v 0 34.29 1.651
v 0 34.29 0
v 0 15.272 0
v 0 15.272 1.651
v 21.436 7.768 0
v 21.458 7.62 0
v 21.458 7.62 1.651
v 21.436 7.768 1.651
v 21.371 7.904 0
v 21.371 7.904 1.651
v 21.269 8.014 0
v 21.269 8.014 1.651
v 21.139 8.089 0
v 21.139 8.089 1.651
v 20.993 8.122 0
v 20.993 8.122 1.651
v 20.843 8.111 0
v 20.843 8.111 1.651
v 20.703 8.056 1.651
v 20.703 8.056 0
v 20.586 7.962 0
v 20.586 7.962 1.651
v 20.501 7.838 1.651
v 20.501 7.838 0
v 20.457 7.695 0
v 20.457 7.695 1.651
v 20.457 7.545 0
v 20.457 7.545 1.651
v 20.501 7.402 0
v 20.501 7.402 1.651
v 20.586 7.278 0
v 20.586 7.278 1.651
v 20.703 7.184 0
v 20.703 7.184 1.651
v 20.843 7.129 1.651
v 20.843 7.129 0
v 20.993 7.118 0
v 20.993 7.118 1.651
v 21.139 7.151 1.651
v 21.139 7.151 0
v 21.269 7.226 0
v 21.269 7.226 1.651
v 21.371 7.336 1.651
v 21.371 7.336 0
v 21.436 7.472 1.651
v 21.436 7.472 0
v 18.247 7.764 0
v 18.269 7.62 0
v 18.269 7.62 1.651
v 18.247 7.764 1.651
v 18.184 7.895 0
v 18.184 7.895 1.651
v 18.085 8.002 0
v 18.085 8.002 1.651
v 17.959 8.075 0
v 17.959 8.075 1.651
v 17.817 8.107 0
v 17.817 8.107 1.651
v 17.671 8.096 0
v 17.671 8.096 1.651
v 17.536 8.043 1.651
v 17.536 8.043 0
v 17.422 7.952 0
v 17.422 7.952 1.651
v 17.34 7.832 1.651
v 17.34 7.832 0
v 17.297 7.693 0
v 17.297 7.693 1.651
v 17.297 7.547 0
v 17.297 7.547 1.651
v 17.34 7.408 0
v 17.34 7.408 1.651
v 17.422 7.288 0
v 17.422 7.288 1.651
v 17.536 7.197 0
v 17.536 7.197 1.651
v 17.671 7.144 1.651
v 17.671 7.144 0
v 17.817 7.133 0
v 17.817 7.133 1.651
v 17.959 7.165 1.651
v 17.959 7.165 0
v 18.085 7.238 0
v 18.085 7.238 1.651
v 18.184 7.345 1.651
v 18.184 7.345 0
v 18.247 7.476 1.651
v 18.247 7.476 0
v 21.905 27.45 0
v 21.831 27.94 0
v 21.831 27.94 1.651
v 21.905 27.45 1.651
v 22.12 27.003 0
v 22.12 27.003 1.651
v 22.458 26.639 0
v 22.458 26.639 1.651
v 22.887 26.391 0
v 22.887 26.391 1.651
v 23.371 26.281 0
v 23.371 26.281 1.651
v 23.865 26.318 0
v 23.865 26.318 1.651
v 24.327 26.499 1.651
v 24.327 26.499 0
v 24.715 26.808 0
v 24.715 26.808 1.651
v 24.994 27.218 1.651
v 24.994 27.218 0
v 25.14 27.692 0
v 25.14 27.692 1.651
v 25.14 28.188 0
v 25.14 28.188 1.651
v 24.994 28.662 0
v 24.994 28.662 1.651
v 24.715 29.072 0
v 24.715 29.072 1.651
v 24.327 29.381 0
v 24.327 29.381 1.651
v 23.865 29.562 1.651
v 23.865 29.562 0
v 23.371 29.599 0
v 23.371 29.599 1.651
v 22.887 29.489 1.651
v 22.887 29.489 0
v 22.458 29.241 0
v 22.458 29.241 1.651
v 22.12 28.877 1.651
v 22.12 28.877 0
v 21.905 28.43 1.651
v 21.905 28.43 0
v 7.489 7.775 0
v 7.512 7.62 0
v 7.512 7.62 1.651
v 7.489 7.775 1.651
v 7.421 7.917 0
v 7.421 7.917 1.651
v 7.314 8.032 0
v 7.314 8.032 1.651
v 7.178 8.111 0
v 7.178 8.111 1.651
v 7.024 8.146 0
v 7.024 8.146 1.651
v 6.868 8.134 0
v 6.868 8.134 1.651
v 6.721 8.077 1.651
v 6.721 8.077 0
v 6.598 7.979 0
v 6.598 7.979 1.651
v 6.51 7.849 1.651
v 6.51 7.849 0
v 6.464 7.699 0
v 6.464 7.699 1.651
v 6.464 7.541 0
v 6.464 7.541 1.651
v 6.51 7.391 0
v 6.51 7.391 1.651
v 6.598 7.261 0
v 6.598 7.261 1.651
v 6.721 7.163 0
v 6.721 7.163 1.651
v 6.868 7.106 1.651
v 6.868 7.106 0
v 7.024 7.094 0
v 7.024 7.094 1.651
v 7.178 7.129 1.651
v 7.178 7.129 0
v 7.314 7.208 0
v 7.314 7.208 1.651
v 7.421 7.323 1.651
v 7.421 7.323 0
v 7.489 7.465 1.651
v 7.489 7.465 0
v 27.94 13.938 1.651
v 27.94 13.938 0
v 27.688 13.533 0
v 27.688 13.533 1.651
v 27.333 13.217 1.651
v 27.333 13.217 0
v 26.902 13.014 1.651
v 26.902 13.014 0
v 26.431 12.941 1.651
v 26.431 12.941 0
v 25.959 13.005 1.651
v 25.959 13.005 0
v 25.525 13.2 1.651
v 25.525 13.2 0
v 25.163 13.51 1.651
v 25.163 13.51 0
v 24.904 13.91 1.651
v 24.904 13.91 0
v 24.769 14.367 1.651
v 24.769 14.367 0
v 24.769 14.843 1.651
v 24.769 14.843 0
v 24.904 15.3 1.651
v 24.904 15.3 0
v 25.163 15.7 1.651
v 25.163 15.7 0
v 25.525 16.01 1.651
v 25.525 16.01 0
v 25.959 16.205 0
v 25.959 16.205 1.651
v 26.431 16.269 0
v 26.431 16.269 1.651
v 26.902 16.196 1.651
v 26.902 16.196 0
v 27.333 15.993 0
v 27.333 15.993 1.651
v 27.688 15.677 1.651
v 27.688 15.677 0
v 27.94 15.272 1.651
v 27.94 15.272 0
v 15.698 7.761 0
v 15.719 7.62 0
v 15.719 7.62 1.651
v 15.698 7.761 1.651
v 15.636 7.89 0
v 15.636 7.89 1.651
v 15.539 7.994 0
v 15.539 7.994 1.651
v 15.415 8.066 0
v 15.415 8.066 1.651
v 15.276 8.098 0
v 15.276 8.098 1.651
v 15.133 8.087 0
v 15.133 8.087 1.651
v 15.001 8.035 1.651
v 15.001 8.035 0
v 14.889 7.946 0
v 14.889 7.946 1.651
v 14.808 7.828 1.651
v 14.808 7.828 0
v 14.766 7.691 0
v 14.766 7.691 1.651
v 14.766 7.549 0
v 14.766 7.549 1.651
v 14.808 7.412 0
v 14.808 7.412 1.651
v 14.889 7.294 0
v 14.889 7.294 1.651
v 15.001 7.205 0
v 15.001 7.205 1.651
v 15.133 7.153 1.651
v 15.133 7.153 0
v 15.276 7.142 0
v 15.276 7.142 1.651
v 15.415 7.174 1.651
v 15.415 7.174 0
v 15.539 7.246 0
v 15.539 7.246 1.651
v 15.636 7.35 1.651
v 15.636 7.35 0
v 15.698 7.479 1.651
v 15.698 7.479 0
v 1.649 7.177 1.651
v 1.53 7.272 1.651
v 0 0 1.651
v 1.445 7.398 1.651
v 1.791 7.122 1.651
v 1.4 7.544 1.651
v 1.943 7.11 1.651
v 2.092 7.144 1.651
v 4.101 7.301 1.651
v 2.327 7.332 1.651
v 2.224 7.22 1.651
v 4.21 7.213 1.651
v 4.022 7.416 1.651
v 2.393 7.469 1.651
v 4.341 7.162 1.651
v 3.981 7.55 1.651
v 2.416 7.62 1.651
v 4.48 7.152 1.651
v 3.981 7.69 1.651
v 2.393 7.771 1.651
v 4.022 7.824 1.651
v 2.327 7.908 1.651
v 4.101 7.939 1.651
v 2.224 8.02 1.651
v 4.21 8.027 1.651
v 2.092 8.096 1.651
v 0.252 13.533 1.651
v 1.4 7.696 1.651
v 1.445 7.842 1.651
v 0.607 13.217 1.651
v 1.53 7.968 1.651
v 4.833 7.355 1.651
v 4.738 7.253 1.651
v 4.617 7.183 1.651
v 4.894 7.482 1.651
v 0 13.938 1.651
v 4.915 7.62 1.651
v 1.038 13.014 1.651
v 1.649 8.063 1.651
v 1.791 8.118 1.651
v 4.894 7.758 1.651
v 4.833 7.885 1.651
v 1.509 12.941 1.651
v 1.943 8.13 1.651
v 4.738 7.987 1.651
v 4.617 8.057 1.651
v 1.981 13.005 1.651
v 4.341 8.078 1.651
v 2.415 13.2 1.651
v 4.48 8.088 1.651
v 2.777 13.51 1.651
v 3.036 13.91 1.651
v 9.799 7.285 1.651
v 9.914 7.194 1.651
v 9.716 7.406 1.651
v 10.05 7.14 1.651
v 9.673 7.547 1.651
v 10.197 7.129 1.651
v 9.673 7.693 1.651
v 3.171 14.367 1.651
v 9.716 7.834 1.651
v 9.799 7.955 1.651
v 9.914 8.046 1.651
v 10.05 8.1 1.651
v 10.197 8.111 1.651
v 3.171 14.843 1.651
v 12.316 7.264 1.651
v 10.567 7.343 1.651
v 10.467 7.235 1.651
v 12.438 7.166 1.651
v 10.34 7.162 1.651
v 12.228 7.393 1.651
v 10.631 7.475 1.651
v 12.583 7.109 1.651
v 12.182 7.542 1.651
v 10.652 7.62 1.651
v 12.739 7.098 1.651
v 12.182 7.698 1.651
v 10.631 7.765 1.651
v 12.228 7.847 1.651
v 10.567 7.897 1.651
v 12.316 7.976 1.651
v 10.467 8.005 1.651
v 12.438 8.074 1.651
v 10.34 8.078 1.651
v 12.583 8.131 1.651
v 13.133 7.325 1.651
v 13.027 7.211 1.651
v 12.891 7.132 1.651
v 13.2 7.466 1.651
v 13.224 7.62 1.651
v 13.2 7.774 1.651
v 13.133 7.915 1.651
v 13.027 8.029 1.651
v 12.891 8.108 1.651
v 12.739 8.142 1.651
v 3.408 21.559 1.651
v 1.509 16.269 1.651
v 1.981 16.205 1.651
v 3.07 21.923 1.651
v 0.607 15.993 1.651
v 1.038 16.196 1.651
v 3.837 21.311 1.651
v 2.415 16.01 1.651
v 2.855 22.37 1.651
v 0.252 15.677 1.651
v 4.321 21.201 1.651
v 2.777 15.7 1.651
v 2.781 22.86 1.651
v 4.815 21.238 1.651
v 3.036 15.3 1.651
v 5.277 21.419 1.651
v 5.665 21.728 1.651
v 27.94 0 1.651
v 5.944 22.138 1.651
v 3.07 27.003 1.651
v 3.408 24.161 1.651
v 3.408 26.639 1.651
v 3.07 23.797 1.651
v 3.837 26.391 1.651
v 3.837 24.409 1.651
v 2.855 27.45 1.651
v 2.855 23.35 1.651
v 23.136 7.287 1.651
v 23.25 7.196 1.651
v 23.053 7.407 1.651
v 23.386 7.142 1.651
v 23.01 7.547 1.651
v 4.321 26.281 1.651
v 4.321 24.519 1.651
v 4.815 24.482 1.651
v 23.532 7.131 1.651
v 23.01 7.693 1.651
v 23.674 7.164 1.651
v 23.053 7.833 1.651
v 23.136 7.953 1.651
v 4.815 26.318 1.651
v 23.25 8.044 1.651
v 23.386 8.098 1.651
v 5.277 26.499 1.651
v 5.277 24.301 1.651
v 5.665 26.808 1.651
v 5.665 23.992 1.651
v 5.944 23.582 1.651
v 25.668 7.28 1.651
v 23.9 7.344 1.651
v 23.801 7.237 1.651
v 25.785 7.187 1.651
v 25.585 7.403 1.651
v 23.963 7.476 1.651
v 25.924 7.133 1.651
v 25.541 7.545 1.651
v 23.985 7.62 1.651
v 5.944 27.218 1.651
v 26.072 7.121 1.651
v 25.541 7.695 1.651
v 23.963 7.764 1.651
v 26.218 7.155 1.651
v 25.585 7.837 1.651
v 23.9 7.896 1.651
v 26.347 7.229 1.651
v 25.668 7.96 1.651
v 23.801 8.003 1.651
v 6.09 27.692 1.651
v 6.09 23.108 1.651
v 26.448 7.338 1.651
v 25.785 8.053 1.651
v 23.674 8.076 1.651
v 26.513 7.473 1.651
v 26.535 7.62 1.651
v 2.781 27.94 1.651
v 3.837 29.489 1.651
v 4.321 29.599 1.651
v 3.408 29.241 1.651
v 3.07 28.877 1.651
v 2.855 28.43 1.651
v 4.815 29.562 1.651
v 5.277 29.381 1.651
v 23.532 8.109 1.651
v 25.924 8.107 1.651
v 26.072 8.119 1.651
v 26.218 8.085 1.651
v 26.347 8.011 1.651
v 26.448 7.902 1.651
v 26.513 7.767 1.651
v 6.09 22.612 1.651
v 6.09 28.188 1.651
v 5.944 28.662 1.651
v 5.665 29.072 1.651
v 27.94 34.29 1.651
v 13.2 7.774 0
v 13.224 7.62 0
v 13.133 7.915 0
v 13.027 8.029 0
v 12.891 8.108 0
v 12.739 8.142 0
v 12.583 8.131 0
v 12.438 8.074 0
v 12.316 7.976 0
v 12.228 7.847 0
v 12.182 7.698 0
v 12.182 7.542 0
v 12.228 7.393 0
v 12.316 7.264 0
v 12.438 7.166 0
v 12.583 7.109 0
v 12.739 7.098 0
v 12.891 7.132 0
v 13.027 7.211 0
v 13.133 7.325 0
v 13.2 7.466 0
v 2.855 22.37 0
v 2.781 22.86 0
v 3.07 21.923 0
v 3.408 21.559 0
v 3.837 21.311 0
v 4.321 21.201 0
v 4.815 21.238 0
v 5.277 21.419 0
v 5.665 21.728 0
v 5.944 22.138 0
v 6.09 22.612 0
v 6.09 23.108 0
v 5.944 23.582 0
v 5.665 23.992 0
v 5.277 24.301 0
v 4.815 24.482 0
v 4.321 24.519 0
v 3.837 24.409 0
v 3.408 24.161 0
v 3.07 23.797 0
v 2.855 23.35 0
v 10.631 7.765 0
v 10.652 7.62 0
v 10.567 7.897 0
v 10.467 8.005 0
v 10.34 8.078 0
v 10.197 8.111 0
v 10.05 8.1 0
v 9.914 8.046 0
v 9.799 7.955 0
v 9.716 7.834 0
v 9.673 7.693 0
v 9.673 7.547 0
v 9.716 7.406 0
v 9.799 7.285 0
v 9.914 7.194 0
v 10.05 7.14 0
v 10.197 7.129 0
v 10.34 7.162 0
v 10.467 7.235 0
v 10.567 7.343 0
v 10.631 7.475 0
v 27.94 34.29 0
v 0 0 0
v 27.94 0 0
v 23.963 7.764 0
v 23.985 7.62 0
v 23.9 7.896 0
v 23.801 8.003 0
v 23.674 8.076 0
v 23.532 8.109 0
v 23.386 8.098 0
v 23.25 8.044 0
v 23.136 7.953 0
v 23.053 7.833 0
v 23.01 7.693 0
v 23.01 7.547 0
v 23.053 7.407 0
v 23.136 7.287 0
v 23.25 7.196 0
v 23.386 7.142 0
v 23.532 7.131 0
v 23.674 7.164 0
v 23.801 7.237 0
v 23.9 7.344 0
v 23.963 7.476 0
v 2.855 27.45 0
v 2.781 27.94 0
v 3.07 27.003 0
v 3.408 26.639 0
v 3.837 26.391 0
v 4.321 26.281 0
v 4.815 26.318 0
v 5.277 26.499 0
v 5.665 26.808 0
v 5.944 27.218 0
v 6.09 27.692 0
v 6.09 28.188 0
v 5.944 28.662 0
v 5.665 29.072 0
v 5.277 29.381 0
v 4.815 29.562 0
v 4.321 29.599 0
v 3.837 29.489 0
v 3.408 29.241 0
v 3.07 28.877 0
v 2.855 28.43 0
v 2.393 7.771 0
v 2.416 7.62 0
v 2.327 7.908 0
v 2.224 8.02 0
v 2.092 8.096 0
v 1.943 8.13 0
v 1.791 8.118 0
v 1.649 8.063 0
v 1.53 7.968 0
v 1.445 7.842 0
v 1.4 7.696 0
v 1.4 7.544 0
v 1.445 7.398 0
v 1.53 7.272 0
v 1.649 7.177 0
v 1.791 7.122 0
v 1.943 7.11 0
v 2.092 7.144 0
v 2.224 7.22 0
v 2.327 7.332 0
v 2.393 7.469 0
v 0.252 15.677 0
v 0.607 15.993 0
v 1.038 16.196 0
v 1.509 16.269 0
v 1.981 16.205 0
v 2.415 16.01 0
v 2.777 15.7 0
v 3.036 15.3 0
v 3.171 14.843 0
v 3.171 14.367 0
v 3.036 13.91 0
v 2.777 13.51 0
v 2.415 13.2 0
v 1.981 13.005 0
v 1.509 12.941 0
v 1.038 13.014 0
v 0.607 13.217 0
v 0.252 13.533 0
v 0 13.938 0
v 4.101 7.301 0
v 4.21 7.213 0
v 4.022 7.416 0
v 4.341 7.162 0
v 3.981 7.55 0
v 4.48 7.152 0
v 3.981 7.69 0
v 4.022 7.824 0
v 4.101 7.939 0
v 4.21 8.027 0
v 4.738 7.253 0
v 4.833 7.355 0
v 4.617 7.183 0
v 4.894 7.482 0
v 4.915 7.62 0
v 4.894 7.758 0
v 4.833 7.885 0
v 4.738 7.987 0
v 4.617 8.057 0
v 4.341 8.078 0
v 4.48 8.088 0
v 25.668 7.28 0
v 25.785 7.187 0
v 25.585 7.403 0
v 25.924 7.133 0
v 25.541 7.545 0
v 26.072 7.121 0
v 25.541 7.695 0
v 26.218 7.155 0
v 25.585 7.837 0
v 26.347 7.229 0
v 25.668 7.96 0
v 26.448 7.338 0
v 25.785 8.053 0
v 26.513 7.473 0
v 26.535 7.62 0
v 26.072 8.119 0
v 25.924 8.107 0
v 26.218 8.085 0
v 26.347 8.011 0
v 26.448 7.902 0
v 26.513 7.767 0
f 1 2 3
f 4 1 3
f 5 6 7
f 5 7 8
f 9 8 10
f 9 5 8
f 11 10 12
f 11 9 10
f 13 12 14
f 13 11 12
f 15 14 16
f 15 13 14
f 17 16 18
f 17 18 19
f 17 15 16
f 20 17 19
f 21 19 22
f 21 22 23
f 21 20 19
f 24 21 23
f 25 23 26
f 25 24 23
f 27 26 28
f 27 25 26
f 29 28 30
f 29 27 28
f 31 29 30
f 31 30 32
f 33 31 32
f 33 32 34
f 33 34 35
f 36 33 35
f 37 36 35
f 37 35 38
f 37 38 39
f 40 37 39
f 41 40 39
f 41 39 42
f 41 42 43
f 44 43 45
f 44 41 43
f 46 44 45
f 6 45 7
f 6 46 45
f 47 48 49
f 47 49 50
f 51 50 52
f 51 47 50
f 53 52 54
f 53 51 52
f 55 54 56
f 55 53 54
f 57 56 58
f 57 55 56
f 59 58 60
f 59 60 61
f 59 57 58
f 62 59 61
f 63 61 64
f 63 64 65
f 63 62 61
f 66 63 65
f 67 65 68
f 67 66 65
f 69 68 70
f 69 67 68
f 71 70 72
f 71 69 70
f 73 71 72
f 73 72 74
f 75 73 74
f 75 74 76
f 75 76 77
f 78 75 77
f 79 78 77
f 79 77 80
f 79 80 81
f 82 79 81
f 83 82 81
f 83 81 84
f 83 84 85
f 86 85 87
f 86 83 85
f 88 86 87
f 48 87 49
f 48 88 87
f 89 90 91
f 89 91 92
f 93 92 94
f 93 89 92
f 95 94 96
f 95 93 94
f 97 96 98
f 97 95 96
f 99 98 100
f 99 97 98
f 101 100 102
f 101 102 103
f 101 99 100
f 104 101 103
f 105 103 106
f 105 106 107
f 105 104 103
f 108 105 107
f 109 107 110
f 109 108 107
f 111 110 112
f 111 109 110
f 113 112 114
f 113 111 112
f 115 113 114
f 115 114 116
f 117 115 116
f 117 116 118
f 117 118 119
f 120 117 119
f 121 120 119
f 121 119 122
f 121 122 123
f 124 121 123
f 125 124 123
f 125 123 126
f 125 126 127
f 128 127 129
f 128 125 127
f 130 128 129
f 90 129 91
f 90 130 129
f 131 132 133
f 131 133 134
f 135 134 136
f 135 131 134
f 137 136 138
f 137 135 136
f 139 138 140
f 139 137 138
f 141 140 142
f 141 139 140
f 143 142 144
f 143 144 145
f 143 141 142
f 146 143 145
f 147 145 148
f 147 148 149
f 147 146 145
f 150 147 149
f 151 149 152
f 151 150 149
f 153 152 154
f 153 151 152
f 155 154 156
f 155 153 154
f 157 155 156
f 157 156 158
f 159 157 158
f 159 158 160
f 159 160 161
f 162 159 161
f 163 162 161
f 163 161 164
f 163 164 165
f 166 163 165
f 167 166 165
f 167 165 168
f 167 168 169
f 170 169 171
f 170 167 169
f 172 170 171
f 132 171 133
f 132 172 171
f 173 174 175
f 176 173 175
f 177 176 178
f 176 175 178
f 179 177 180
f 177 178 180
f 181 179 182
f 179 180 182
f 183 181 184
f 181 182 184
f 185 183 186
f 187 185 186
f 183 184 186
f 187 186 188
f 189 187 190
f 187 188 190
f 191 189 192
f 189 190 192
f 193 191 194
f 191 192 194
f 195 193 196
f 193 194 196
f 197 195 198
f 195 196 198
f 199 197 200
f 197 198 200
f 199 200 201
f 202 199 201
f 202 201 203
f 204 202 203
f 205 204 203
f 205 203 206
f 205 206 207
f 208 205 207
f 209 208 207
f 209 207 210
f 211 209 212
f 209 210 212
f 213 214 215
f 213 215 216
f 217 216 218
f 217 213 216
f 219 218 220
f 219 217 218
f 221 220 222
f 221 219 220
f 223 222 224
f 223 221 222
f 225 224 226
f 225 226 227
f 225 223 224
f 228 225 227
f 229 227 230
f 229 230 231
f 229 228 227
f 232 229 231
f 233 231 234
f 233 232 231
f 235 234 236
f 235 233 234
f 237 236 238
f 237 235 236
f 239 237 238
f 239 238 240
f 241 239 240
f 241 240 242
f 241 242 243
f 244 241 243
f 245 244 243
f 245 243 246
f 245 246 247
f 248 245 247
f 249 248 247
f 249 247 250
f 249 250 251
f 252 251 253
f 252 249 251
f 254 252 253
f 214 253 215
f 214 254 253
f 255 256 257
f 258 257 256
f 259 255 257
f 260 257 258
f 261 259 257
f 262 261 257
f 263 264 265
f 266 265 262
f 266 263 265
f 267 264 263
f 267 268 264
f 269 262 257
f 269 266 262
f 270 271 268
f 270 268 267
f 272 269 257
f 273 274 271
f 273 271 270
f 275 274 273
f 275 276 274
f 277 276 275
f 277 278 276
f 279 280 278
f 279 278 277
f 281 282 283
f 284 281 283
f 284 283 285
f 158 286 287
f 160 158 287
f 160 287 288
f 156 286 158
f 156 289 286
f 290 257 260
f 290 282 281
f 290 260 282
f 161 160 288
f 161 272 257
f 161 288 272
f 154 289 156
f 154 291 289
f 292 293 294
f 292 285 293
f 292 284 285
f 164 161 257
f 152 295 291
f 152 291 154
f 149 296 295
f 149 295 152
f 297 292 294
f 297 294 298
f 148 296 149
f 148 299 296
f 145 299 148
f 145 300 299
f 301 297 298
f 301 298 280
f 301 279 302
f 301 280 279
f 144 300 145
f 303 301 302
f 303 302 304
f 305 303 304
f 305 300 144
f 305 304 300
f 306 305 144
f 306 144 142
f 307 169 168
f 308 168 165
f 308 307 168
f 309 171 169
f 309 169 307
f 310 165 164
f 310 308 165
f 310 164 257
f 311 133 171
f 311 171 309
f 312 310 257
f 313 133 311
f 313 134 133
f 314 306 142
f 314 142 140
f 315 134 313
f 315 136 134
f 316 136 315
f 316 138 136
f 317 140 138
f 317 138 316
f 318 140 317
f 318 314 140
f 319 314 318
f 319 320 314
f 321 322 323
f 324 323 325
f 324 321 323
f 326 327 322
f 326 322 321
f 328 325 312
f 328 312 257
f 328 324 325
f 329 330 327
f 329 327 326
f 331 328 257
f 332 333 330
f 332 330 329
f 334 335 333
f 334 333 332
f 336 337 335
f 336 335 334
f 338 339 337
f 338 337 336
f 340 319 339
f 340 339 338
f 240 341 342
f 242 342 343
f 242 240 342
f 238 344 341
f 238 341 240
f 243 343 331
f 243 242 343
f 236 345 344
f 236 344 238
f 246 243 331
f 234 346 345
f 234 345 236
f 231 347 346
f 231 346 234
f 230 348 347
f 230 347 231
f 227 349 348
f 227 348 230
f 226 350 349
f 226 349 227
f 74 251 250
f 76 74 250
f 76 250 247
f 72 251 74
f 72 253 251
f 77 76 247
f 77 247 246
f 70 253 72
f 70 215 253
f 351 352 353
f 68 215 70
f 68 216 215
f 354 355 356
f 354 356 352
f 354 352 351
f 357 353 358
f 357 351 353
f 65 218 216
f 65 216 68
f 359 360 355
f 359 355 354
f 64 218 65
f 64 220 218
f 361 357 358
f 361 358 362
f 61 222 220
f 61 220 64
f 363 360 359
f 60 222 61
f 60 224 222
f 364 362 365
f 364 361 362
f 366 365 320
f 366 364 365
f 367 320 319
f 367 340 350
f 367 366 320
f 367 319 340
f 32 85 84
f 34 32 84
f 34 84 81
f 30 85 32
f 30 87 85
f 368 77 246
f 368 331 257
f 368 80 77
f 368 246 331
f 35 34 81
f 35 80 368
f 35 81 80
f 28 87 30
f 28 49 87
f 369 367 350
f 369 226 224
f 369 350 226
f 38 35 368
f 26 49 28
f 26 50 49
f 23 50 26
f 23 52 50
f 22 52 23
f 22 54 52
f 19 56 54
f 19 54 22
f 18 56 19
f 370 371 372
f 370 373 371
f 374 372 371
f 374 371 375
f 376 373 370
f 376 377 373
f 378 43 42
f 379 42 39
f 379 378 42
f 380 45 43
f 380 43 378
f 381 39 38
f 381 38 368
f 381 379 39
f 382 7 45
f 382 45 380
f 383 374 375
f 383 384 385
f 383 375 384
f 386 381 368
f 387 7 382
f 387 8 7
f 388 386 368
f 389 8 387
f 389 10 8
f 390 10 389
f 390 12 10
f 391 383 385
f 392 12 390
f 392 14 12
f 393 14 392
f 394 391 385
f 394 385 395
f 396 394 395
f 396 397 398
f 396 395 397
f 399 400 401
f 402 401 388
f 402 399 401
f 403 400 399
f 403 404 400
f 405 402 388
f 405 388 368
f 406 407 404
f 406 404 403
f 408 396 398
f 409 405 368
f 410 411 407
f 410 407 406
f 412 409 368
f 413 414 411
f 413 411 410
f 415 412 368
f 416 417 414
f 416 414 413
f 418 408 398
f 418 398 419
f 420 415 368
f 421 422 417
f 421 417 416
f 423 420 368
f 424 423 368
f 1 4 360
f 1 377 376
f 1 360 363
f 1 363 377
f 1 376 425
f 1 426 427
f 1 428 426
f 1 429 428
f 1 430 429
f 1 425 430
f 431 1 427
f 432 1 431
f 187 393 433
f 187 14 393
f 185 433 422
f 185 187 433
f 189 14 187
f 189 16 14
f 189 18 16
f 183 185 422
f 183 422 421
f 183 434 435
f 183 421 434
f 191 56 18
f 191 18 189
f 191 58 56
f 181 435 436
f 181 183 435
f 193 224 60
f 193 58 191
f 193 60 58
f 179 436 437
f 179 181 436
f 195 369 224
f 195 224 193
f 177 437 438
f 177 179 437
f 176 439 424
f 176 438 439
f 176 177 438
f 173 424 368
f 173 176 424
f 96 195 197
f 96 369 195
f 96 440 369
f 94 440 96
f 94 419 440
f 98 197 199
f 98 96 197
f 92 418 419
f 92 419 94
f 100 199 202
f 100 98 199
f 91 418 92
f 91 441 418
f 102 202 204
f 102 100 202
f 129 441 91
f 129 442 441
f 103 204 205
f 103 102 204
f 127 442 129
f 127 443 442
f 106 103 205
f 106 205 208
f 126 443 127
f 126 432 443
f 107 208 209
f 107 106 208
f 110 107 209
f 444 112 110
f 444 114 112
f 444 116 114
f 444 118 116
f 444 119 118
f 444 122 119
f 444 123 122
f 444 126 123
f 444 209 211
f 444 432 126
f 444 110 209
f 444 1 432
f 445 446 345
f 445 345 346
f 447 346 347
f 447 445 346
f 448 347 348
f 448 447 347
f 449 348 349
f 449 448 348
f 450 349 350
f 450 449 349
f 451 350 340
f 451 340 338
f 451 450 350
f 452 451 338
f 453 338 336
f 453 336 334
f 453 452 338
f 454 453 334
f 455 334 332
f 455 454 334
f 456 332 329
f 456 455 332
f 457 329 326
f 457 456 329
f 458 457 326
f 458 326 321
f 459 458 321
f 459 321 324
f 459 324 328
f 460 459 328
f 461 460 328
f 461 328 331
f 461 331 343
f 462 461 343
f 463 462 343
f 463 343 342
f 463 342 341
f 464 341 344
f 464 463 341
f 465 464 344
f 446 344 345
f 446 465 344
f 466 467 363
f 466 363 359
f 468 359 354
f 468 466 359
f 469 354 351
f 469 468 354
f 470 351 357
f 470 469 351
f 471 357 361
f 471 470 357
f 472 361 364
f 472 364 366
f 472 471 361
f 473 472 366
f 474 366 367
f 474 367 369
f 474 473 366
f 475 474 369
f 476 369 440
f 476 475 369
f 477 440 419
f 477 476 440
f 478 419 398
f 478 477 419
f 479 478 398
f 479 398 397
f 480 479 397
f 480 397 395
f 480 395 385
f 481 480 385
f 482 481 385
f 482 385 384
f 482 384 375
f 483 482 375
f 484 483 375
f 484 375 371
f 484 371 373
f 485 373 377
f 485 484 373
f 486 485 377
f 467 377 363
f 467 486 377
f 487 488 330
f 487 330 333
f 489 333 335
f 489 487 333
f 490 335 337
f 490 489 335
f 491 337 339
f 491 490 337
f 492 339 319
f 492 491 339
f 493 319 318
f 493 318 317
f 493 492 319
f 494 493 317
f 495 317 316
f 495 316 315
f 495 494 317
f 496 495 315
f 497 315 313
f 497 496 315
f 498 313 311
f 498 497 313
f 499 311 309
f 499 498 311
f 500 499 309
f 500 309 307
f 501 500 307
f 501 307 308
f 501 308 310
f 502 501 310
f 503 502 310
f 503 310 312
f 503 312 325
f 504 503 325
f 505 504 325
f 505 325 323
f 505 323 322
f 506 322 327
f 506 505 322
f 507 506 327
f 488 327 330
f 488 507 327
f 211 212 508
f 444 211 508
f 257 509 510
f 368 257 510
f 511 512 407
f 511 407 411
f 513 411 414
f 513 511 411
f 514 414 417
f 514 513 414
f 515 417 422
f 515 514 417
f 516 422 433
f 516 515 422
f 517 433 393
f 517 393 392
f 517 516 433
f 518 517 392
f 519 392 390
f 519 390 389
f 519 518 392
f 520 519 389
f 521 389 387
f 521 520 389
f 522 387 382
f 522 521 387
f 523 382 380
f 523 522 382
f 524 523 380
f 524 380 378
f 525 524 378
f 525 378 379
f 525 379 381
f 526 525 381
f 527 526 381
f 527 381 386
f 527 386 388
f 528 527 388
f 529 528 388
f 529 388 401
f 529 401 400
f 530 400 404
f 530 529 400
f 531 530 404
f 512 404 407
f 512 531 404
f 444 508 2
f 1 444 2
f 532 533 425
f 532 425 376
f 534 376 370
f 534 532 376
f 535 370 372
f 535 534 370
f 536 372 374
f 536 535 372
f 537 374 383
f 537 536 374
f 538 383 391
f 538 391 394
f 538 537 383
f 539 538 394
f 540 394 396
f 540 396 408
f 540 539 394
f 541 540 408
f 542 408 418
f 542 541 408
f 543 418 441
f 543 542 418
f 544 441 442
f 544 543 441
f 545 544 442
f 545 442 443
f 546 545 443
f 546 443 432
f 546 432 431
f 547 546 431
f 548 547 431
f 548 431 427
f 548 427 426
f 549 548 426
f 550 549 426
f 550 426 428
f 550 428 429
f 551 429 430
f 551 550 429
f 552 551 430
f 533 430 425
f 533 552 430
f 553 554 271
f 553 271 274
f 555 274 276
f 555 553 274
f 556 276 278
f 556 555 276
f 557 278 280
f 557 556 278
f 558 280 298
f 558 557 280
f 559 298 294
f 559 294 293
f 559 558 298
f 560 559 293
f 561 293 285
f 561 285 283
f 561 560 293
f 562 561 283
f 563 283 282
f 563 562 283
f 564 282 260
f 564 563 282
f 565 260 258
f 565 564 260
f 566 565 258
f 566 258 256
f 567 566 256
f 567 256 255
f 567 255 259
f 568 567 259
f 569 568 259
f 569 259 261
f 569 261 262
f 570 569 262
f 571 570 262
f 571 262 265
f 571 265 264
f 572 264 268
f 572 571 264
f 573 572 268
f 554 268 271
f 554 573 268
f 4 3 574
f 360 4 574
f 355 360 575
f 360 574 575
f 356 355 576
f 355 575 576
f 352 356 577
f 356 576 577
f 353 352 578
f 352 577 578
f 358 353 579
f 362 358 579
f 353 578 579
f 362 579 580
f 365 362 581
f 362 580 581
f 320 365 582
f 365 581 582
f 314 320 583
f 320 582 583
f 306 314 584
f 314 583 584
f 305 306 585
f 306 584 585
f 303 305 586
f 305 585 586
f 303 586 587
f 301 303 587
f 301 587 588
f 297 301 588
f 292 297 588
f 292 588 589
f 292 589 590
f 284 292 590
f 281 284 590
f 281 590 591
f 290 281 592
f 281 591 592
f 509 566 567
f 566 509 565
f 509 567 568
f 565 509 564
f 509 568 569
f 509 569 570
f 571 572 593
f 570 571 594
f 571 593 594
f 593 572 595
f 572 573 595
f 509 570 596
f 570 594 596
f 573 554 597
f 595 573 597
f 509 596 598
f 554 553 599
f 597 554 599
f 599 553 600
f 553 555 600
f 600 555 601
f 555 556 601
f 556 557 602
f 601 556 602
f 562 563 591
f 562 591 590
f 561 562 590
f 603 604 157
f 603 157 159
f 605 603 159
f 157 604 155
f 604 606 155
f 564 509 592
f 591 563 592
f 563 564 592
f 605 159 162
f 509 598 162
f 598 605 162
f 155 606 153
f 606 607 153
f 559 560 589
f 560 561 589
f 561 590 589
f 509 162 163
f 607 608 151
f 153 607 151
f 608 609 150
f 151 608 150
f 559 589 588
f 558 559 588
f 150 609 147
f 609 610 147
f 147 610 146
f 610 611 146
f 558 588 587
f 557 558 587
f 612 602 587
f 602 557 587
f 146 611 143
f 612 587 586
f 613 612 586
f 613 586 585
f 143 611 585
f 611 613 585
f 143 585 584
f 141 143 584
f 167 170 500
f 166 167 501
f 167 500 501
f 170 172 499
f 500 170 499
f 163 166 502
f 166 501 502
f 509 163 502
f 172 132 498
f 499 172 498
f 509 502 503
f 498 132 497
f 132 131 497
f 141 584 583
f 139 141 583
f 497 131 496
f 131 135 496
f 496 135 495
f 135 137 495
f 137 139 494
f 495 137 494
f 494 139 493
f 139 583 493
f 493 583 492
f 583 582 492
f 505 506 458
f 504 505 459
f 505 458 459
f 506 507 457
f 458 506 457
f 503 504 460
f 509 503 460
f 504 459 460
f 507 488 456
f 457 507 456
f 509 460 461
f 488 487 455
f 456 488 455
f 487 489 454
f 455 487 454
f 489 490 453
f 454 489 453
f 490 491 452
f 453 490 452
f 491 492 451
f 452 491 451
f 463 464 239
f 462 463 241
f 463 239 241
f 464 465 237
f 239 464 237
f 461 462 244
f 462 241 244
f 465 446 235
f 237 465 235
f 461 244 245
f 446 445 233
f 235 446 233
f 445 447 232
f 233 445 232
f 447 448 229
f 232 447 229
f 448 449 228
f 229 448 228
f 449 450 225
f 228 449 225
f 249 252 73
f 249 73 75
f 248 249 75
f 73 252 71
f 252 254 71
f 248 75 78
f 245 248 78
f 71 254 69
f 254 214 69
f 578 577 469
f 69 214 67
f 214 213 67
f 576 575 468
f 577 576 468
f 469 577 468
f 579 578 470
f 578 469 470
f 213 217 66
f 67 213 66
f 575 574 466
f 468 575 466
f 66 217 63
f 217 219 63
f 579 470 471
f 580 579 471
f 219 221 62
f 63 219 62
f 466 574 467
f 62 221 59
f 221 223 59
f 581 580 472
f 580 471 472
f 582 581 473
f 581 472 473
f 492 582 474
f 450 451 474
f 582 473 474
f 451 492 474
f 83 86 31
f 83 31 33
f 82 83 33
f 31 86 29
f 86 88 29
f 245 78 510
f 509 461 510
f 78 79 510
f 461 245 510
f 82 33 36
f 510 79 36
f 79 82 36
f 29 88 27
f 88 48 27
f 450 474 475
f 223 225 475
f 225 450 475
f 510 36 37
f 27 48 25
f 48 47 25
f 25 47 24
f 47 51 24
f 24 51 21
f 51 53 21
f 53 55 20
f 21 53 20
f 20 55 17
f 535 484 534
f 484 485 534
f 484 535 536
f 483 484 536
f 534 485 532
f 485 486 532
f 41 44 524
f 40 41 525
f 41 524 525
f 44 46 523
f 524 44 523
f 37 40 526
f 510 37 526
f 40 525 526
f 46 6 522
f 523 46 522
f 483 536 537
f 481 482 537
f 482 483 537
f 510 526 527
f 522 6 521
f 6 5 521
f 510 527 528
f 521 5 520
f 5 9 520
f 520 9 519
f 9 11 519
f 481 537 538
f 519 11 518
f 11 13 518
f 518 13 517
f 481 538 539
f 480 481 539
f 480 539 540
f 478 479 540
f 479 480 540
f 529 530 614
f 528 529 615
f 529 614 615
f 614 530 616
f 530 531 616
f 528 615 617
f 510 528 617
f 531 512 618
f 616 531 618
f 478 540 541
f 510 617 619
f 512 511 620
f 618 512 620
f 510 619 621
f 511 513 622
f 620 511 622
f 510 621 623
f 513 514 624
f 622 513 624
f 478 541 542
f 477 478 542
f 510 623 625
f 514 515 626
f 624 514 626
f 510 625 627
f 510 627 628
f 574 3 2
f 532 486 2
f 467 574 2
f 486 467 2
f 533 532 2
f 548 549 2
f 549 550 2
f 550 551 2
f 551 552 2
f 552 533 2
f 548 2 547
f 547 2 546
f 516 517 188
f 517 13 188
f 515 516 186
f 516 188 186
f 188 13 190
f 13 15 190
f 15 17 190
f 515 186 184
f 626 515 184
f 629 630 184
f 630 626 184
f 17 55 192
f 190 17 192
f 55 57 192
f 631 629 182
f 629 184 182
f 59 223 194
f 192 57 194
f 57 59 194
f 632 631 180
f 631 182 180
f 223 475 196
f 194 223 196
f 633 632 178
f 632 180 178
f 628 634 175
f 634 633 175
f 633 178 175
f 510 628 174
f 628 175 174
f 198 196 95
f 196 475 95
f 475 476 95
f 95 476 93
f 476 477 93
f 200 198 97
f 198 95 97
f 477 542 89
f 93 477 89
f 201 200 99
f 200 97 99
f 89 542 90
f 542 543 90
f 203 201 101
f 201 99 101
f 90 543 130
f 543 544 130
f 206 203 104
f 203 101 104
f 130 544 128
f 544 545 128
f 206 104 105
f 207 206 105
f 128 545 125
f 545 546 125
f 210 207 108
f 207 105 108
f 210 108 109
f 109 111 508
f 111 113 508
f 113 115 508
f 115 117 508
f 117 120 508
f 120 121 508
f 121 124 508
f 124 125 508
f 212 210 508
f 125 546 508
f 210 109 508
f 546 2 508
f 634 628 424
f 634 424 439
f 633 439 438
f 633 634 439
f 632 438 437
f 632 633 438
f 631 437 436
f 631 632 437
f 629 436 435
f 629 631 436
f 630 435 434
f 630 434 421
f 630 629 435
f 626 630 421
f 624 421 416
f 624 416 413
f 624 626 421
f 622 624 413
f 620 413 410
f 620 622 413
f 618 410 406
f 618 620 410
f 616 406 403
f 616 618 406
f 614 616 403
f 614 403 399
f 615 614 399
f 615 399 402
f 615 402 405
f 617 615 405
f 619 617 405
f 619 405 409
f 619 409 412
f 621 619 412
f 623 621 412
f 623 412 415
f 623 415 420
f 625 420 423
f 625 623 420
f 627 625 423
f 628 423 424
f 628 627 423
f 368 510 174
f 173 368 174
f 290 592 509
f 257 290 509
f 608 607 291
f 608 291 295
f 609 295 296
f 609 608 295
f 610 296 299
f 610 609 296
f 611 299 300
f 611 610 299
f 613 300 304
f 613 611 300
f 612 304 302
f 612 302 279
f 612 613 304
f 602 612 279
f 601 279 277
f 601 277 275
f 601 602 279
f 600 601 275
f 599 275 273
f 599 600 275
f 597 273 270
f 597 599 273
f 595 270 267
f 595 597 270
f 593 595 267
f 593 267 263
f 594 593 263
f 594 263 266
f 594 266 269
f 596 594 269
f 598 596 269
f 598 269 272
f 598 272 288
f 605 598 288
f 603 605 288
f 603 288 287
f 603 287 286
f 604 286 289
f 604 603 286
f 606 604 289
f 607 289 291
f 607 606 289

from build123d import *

# Parameters (mm, degrees)
SKETCH2_R           = 1.6637
SKETCH2_R_2         = 0.511037547
SKETCH2_R_3         = 0.469586325
SKETCH2_R_4         = 0.527304242
SKETCH2_R_5         = 0.492462629
SKETCH2_R_6         = 0.523724162
SKETCH2_R_7         = 0.478944742
SKETCH2_R_8         = 0.488742189
SKETCH2_R_9         = 0.503485145
SKETCH2_R_10        = 0.490154406
SKETCH2_R_11        = 0.499999
BOSS_EXTRUDE1_DEPTH = 1.651


with BuildPart() as part:
    # Sketch2 → Boss-Extrude1 (new body)
    with BuildSketch(Plane.XY):
        with BuildLine():
            Line((0, 0), (27.94, 0))
            Line((27.94, 0), (27.94, 13.937675724))
            ThreePointArc((27.94, 13.937675724), (24.7523, 14.605), (27.94, 15.272324276))
            Line((27.94, 15.272324276), (27.94, 34.29))
            Line((27.94, 34.29), (0, 34.29))
            Line((0, 34.29), (0, 15.272324276))
            ThreePointArc((0, 15.272324276), (3.1877, 14.605), (0, 13.937675724))
            Line((0, 13.937675724), (0, 0))
        make_face()
        with Locations((4.445, 22.86)):
            Circle(SKETCH2_R, mode=Mode.SUBTRACT)
        with Locations((4.445, 27.94)):
            Circle(SKETCH2_R, mode=Mode.SUBTRACT)
        with Locations((23.495, 27.94)):
            Circle(SKETCH2_R, mode=Mode.SUBTRACT)
        with Locations((1.905, 7.62)):
            Circle(SKETCH2_R_2, mode=Mode.SUBTRACT)
        with Locations((4.445, 7.62)):
            Circle(SKETCH2_R_3, mode=Mode.SUBTRACT)
        with Locations((6.985, 7.62)):
            Circle(SKETCH2_R_4, mode=Mode.SUBTRACT)
        with Locations((10.16, 7.62)):
            Circle(SKETCH2_R_5, mode=Mode.SUBTRACT)
        with Locations((12.7, 7.62)):
            Circle(SKETCH2_R_6, mode=Mode.SUBTRACT)
        with Locations((15.24, 7.62)):
            Circle(SKETCH2_R_7, mode=Mode.SUBTRACT)
        with Locations((17.78, 7.62)):
            Circle(SKETCH2_R_8, mode=Mode.SUBTRACT)
        with Locations((20.955, 7.62)):
            Circle(SKETCH2_R_9, mode=Mode.SUBTRACT)
        with Locations((23.495, 7.62)):
            Circle(SKETCH2_R_10, mode=Mode.SUBTRACT)
        with Locations((26.035, 7.62)):
            Circle(SKETCH2_R_11, mode=Mode.SUBTRACT)
    extrude(amount=BOSS_EXTRUDE1_DEPTH)


solid = part.part
